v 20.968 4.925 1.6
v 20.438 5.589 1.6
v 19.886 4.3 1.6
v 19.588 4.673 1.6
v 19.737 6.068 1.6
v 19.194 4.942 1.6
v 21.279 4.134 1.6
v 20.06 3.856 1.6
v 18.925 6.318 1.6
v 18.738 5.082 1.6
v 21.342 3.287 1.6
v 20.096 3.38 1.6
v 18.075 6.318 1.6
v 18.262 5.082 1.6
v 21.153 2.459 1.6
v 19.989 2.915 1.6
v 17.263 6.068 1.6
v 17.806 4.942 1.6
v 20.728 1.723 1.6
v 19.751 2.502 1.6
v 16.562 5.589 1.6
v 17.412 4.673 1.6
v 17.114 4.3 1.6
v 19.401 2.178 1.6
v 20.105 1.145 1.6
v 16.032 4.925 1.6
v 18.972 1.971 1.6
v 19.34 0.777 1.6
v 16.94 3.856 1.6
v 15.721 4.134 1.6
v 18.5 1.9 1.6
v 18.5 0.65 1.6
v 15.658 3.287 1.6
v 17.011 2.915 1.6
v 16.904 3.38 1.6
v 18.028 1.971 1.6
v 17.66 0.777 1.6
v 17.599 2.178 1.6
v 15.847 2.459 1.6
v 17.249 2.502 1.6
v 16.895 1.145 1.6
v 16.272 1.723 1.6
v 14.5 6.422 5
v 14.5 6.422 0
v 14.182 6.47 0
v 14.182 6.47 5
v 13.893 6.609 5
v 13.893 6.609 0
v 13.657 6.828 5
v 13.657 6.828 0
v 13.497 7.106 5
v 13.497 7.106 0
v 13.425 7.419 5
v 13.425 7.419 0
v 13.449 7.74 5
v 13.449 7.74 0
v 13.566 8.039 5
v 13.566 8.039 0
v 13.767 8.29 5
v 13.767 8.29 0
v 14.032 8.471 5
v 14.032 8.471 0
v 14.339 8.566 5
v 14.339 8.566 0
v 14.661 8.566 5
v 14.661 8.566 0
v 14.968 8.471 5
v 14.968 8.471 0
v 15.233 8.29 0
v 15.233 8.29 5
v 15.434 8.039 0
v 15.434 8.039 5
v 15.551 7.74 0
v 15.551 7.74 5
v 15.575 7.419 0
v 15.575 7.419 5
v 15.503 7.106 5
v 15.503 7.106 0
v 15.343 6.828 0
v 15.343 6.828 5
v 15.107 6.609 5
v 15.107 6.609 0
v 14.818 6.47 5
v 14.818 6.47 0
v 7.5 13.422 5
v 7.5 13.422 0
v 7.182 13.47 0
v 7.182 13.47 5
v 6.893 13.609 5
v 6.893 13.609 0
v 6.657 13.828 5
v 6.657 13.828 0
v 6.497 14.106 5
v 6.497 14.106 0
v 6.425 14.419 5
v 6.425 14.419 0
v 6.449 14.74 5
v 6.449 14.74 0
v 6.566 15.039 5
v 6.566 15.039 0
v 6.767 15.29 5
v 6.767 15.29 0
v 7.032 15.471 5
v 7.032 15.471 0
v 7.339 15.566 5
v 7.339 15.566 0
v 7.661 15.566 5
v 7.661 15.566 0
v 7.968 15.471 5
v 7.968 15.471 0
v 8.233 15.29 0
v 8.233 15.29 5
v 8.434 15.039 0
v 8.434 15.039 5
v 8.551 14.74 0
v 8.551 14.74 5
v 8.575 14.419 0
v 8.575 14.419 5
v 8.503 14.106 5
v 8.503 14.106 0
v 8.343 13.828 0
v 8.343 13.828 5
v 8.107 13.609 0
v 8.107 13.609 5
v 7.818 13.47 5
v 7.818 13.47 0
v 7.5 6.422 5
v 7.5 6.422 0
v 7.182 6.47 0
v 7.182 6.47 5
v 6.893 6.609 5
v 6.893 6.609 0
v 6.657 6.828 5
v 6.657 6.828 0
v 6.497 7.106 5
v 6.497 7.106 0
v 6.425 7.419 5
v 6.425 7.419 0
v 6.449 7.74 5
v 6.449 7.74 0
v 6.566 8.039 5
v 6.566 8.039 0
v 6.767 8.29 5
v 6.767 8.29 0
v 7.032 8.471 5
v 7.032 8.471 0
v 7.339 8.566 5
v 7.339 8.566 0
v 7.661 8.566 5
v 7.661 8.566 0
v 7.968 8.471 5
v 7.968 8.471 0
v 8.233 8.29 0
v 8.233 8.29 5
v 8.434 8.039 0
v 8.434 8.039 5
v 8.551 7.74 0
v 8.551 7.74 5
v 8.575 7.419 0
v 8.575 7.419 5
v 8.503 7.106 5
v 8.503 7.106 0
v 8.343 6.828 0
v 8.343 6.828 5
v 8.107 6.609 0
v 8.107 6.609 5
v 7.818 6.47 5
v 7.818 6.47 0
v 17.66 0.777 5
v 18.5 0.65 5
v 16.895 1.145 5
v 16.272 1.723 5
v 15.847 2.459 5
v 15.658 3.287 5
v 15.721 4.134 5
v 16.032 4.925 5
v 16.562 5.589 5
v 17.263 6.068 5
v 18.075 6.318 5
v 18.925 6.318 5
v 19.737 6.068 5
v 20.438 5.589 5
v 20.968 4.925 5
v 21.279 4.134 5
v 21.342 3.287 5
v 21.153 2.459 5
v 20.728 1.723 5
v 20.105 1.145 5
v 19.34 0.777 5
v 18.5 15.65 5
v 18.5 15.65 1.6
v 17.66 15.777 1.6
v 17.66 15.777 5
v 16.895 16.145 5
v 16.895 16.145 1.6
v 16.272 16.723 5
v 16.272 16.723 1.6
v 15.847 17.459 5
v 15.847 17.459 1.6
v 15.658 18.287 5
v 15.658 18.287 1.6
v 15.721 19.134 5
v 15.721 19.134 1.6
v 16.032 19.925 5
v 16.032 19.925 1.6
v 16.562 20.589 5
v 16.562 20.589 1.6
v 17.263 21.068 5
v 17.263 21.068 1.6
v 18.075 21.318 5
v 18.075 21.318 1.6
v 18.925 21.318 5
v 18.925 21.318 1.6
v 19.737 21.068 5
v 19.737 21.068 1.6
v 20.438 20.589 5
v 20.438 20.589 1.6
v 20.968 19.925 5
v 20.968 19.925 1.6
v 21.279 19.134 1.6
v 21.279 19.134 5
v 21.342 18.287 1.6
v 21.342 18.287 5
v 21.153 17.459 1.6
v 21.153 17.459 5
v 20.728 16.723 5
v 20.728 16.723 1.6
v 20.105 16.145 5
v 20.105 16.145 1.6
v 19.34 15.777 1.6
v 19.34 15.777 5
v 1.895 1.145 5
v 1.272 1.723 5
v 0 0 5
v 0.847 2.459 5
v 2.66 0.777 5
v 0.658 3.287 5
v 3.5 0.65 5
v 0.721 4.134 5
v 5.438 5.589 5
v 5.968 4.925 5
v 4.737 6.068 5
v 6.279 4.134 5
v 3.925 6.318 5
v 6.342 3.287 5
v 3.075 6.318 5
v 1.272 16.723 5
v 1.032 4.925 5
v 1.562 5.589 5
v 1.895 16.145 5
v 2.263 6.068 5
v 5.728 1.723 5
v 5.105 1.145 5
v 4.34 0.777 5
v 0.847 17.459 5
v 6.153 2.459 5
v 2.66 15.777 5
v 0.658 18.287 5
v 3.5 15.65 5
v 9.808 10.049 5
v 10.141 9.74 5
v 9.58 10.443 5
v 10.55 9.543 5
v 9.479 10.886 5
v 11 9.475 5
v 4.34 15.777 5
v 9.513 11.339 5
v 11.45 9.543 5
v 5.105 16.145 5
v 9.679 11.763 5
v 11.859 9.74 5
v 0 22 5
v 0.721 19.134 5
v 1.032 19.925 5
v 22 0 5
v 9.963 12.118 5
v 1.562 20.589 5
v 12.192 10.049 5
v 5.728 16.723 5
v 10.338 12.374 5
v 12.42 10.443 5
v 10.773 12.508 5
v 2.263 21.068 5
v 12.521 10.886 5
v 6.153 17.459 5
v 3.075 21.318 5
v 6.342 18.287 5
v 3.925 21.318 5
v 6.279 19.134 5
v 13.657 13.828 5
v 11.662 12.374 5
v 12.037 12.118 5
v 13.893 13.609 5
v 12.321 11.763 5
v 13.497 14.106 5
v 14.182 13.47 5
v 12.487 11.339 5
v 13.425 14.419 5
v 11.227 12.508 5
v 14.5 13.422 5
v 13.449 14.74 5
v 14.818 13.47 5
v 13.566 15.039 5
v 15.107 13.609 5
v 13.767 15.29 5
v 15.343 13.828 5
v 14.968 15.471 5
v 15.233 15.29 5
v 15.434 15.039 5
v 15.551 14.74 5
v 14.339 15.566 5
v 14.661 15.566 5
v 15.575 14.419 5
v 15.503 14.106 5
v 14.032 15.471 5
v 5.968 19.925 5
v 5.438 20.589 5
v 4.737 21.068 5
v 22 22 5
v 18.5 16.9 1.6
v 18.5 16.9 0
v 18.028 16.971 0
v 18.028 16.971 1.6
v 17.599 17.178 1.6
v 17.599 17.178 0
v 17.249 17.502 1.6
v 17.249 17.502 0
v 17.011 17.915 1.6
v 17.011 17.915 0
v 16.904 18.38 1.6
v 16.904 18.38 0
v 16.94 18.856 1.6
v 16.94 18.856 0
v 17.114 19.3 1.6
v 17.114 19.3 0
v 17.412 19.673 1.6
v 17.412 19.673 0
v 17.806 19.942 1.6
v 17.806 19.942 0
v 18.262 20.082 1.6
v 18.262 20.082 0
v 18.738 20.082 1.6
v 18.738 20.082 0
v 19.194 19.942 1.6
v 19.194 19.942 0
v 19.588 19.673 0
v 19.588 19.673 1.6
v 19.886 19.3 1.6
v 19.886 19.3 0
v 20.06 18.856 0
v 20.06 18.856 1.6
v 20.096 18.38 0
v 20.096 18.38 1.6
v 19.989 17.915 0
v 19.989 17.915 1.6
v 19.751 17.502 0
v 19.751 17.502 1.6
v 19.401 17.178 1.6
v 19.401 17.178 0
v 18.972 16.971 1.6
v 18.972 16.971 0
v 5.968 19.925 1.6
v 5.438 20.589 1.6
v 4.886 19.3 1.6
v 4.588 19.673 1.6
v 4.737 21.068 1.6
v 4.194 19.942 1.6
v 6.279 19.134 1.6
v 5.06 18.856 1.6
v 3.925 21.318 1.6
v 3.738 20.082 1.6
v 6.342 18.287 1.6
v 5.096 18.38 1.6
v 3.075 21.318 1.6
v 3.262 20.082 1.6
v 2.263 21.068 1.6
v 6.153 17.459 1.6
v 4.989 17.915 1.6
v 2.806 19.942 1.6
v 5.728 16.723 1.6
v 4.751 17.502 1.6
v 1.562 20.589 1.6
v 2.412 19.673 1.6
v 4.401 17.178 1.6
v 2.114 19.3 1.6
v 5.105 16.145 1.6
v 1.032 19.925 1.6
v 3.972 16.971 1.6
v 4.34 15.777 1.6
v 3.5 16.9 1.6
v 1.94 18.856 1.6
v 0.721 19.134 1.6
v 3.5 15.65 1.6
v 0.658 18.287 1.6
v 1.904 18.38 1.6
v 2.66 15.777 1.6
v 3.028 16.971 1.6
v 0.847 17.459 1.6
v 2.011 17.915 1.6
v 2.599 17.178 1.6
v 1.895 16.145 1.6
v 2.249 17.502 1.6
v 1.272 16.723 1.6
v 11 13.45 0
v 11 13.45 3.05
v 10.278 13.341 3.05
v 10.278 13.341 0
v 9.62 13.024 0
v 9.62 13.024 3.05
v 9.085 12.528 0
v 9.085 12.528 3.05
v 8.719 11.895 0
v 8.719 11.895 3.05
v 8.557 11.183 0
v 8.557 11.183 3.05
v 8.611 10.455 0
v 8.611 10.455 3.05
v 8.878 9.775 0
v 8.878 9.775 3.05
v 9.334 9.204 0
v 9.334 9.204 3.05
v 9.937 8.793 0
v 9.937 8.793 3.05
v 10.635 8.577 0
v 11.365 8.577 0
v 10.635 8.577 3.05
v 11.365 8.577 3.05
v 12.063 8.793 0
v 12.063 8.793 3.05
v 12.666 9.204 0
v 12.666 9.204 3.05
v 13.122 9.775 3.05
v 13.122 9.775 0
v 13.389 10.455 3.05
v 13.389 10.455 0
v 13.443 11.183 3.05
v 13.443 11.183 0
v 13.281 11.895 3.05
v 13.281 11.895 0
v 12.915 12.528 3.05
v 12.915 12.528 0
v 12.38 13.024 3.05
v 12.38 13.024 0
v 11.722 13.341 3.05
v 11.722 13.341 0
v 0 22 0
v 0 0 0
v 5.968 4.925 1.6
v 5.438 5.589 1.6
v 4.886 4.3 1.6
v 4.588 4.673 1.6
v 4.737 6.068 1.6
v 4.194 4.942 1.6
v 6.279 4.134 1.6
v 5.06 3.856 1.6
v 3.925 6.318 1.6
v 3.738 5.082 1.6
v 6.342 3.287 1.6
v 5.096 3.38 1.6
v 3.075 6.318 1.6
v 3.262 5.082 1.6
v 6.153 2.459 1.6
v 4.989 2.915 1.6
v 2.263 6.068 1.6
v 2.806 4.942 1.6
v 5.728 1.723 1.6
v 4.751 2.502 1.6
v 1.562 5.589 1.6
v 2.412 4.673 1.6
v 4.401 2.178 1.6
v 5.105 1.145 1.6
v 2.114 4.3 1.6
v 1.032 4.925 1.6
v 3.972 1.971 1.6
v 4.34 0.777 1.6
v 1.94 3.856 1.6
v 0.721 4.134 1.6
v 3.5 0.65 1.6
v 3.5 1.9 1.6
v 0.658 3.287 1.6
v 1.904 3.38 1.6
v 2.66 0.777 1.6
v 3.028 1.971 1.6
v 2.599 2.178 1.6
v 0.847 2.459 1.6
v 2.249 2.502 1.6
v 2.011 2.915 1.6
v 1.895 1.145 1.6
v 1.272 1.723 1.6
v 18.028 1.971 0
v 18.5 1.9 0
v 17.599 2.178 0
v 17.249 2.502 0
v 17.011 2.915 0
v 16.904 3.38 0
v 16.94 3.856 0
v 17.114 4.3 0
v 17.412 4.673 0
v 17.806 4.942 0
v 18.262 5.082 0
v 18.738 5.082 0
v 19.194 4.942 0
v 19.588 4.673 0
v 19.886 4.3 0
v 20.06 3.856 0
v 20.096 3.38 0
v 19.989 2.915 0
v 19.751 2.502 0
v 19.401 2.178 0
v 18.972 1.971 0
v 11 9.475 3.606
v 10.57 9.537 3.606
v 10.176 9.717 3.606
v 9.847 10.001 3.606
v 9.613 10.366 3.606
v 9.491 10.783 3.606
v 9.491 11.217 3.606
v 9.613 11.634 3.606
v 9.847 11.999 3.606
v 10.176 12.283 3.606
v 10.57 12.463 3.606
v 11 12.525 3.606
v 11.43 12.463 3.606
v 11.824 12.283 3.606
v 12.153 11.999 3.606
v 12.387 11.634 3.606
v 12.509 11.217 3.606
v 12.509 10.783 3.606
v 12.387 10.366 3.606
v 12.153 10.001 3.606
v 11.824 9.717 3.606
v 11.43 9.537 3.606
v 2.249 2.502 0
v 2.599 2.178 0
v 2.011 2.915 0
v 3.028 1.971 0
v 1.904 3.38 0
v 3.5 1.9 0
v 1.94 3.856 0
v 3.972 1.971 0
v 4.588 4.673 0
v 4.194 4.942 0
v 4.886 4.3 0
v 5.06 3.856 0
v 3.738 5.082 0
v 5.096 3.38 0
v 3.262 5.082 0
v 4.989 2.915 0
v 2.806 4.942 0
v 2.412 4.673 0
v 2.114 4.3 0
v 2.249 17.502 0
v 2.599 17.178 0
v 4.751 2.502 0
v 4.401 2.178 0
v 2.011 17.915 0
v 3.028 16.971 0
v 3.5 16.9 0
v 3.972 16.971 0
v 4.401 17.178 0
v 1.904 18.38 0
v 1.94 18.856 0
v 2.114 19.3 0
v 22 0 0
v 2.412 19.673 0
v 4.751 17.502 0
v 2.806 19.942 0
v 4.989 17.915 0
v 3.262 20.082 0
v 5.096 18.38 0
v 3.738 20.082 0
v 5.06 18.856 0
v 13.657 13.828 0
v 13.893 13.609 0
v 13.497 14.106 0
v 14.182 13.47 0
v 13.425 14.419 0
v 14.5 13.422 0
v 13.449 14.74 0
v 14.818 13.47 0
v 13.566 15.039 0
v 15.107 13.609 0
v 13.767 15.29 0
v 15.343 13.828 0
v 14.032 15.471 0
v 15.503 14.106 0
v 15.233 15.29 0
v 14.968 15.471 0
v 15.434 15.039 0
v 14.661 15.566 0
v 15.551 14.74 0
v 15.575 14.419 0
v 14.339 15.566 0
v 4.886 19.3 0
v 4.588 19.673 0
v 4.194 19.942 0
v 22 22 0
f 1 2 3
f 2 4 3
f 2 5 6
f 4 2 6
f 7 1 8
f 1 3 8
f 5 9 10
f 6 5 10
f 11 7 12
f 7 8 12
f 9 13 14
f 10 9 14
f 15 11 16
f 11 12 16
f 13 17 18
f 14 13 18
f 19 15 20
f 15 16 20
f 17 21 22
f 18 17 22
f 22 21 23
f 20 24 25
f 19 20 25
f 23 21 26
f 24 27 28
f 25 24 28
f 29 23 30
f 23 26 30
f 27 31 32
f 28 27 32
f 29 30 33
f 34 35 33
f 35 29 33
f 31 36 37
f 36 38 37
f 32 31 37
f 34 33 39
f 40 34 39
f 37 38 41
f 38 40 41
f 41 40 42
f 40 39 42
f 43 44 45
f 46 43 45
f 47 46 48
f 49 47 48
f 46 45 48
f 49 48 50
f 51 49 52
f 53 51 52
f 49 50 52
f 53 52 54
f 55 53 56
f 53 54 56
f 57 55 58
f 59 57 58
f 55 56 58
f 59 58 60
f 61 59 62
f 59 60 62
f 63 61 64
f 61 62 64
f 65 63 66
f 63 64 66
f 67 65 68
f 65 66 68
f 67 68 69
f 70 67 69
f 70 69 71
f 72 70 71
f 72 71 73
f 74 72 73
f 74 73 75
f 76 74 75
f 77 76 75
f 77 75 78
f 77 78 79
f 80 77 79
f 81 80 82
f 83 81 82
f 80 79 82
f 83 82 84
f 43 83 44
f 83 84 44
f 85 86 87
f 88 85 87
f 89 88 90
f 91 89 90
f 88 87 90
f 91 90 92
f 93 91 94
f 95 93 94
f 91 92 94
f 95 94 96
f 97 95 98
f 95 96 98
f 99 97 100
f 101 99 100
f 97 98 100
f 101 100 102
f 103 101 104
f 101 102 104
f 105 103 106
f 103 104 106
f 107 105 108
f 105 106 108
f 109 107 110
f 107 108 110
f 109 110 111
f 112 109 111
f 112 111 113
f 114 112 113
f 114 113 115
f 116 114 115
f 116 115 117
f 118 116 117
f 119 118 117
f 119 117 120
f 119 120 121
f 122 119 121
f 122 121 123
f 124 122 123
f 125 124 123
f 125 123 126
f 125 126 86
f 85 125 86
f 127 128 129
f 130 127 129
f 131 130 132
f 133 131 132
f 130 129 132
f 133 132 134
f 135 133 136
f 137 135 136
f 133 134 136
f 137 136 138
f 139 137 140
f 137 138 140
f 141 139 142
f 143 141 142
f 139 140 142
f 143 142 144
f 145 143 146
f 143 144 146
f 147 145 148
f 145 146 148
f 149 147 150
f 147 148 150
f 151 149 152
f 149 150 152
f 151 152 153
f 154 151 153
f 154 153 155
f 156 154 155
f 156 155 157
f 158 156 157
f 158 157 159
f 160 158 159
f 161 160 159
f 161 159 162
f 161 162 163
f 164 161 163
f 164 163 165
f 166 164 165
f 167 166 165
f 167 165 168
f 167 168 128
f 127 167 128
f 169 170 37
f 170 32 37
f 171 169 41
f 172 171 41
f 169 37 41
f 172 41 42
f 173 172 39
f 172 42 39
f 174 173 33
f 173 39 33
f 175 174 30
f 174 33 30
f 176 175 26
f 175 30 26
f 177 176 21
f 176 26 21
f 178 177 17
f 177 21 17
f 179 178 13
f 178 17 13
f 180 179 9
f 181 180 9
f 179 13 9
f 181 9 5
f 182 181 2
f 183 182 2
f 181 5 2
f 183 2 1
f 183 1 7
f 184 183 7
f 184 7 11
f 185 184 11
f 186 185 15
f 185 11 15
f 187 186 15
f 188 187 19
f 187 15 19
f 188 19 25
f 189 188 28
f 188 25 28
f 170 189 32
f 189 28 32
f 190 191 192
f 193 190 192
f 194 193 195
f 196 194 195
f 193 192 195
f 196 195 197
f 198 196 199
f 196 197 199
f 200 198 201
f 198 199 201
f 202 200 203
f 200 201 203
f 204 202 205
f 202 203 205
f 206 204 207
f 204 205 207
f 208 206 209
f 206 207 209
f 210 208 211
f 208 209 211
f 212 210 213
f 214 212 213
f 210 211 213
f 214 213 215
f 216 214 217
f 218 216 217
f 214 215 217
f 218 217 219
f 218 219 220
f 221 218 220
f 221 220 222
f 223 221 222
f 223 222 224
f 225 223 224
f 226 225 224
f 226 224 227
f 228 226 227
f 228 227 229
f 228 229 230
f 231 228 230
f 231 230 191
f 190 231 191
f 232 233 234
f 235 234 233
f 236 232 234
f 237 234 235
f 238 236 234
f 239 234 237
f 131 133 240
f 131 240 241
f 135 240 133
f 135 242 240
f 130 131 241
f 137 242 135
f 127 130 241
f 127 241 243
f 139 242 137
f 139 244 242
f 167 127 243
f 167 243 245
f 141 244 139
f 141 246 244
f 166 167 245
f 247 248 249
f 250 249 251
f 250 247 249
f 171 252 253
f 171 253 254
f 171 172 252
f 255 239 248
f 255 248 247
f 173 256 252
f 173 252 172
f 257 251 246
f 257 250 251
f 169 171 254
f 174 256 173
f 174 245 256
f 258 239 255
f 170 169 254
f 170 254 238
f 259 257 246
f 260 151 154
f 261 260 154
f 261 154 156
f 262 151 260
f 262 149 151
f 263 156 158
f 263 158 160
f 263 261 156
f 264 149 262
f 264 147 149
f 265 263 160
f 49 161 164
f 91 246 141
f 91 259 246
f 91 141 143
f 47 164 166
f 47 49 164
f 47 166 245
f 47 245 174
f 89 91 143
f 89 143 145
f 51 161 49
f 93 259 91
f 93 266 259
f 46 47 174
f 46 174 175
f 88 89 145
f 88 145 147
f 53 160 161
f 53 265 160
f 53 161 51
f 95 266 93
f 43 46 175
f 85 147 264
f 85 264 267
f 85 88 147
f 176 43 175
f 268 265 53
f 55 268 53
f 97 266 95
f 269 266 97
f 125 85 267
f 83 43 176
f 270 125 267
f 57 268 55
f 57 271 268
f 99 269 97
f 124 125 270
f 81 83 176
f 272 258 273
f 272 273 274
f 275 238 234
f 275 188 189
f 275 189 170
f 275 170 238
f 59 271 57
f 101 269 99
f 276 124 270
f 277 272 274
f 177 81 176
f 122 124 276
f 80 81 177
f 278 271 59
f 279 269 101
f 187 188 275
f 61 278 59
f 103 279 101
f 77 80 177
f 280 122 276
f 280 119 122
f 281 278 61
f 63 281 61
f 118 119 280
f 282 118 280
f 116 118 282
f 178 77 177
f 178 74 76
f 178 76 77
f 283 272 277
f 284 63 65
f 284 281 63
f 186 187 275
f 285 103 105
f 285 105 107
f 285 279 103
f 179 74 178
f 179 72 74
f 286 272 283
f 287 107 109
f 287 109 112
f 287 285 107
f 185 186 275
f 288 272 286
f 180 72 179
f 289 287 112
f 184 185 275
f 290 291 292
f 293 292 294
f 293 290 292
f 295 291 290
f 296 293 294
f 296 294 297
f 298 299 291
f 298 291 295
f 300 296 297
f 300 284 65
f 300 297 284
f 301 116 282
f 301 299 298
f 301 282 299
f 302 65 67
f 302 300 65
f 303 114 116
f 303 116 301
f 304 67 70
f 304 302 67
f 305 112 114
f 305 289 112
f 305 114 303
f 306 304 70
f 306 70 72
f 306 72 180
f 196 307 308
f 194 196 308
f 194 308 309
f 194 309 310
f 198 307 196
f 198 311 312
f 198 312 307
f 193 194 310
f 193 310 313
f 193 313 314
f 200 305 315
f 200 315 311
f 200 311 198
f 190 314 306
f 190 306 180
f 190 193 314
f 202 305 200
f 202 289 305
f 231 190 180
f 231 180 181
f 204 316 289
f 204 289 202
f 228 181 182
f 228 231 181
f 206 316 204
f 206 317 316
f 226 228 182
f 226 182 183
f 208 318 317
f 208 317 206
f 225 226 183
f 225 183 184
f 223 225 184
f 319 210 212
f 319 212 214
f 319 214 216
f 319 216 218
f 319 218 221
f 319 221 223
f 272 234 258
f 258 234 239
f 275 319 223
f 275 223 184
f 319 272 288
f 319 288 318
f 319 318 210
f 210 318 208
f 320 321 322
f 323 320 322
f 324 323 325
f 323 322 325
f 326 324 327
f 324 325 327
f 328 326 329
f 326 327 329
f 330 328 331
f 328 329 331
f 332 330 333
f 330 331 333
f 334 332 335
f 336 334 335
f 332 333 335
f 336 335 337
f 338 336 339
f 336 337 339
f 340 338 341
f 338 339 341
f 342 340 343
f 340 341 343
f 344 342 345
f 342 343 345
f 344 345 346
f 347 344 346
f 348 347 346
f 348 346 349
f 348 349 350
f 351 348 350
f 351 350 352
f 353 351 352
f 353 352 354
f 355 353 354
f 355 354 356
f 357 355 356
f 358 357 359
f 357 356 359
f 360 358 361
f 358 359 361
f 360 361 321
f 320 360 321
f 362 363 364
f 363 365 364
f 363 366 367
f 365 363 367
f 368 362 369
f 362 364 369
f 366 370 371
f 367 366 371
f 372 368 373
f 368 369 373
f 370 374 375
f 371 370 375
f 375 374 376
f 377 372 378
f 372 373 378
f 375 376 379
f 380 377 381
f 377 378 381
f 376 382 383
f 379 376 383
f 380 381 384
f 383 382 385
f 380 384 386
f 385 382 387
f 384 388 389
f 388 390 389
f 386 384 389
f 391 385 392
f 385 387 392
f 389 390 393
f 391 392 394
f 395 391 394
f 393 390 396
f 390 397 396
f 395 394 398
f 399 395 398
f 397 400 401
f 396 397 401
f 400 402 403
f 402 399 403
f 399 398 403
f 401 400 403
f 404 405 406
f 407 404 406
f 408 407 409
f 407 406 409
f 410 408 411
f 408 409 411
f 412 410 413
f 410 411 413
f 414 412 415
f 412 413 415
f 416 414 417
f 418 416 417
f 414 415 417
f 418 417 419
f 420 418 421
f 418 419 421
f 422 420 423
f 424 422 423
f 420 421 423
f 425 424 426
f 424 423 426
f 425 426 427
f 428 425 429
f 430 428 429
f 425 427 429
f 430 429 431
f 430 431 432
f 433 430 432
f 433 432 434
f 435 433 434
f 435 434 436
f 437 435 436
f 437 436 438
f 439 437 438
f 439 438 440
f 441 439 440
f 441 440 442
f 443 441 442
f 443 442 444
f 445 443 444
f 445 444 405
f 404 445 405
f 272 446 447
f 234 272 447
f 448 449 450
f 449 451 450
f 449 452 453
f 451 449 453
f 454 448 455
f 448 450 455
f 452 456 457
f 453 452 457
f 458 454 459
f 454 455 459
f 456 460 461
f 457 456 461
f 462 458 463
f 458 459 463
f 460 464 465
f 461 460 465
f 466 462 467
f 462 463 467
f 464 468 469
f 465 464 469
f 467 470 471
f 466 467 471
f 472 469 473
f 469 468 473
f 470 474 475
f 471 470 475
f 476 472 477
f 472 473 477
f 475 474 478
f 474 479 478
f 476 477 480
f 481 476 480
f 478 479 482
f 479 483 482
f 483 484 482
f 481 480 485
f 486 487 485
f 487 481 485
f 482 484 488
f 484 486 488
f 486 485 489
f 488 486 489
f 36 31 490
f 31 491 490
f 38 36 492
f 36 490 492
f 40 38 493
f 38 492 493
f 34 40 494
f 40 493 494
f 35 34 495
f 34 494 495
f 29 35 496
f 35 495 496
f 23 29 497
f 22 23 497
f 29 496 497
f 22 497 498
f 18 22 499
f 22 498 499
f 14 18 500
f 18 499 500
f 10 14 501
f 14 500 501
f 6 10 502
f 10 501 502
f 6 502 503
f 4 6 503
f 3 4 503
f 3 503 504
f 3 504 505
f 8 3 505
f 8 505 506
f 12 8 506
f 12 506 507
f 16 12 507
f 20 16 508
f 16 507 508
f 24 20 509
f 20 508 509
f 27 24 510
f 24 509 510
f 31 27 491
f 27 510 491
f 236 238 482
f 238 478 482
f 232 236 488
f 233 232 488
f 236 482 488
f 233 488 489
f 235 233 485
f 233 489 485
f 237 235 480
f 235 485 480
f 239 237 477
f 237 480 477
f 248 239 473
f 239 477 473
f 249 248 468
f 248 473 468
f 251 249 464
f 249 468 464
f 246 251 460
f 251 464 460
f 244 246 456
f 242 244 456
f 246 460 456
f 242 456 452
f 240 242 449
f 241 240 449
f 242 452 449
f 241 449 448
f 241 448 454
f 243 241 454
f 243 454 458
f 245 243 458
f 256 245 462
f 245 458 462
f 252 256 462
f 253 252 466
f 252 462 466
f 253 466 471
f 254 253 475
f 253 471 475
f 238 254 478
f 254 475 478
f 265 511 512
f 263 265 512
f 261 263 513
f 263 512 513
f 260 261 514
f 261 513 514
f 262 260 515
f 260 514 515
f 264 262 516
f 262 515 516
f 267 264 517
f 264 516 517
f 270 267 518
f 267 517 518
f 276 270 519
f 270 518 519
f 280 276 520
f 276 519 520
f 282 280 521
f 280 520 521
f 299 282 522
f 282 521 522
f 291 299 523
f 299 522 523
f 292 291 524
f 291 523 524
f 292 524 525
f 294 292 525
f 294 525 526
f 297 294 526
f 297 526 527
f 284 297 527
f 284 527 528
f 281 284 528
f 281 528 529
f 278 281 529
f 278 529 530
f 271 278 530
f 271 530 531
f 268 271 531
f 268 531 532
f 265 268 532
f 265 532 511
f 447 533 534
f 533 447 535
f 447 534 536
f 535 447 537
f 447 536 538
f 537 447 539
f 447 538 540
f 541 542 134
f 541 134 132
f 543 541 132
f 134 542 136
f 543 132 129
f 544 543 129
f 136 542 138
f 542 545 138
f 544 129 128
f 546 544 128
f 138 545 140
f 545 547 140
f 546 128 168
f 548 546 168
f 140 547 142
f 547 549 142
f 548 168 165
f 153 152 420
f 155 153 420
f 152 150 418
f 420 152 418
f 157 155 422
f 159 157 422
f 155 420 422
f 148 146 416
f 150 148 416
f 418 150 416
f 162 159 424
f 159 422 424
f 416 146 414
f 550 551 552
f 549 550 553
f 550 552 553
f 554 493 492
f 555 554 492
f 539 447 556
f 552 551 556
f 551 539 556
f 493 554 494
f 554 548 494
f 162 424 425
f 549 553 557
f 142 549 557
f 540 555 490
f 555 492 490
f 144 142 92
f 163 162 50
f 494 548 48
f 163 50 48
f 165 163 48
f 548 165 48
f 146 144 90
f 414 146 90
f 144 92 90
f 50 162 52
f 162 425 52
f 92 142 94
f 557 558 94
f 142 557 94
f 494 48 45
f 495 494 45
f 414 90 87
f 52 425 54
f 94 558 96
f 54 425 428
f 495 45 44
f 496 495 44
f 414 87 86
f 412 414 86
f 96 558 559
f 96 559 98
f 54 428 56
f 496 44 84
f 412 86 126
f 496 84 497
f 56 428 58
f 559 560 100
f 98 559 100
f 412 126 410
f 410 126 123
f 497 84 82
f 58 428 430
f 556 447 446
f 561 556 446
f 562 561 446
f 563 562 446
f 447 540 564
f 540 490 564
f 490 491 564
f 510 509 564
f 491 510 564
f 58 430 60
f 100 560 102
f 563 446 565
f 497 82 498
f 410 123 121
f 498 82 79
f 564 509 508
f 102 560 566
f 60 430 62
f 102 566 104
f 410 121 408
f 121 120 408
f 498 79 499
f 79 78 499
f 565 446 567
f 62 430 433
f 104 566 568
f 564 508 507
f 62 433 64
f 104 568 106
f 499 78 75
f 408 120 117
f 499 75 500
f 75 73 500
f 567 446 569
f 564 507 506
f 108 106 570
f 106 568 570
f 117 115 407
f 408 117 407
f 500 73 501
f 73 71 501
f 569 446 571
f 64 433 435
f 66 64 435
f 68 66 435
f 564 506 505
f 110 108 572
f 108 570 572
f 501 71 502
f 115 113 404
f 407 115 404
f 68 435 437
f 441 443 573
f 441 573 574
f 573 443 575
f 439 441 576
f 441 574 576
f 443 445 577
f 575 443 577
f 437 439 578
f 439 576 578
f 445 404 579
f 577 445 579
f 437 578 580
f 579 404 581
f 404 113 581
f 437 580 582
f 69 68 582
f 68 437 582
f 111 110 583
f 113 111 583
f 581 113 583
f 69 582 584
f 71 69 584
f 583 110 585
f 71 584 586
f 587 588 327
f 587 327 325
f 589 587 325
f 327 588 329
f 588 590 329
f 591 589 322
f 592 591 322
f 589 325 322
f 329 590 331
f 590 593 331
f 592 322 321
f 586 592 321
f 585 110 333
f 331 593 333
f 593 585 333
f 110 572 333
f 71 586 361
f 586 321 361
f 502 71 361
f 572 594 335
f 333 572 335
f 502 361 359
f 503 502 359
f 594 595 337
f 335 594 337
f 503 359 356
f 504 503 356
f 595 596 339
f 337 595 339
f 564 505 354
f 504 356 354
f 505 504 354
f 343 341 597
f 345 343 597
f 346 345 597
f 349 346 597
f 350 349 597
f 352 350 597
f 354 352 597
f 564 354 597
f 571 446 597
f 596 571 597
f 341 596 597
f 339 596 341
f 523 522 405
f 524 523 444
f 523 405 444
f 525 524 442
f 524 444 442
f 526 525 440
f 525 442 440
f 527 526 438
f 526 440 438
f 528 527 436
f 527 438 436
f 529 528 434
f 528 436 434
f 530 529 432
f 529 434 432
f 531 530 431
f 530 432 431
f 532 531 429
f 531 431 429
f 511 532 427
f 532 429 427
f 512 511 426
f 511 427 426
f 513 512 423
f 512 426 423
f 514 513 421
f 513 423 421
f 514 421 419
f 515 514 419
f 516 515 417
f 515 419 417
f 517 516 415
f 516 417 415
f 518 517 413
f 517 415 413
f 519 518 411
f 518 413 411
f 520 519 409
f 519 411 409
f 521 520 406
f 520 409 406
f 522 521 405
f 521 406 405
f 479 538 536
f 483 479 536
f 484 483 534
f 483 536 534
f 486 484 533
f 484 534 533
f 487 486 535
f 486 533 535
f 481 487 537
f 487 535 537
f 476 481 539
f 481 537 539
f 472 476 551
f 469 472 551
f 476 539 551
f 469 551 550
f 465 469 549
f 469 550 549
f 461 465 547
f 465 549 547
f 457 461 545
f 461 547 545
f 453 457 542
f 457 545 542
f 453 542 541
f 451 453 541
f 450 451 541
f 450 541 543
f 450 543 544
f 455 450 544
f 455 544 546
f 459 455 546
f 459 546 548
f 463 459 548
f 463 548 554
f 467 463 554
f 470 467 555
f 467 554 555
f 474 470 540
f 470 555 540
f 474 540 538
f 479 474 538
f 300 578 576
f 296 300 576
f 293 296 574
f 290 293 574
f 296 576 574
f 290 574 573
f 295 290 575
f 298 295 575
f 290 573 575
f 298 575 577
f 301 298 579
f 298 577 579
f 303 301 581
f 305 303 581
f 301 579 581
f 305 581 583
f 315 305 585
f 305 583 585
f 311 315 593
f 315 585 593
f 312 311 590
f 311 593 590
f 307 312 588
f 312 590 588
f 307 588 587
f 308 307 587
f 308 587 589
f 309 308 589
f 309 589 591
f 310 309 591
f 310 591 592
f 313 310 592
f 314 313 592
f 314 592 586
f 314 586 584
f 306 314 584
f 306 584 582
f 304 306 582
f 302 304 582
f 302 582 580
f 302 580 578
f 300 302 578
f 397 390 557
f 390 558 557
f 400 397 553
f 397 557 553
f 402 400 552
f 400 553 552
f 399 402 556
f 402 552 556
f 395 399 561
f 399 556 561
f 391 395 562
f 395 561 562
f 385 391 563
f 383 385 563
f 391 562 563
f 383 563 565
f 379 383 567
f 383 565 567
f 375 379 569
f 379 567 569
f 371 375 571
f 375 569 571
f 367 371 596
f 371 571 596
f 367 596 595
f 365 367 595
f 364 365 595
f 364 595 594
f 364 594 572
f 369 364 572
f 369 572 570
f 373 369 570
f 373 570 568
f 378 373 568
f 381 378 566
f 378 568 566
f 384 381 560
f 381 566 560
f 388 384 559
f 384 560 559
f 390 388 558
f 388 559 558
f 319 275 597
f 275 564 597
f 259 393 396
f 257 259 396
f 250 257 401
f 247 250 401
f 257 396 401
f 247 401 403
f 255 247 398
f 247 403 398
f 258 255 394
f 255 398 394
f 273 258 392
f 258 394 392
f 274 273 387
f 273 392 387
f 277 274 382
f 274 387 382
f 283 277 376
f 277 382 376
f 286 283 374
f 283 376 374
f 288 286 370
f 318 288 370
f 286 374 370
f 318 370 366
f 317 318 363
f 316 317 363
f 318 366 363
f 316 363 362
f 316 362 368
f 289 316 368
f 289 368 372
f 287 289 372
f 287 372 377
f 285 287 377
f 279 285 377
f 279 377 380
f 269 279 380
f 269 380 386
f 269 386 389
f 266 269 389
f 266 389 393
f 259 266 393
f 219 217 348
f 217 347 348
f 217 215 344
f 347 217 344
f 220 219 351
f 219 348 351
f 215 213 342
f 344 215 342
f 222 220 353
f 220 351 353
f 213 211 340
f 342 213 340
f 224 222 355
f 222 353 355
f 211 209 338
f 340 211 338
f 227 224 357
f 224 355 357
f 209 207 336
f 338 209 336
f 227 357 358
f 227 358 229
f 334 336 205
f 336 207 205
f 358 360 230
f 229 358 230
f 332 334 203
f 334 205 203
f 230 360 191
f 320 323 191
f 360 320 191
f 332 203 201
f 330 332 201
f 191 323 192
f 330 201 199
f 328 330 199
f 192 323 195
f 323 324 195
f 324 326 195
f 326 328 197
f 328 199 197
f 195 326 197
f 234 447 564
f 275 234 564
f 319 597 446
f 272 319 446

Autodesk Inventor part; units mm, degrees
ref_plane "YZ Plane" through (0, 0, 0) normal (1, 0, 0) x (0, 1, 0)
ref_plane "XZ Plane" through (0, 0, 0) normal (0, 1, 0) x (-1, 0, 0)
ref_plane "XY Plane" through (0, 0, 0) normal (0, 0, 1) x (1, 0, 0)
sketch "Sketch1" plane through (0, 0, 0) normal (0, 0, 1) x (1, 0, 0)
  line L0 (0, 0) -> (22, 0)
  line L1 (22, 0) -> (22, 22)
  line L2 (22, 22) -> (0, 22)
  line L3 (0, 22) -> (0, 0)
  dimension "d0" = 22
  dimension "d1" = 22
extrude "Extrusion1" add sketch "Sketch1" along normal blind 5
sketch "Sketch2" plane through (0, 0, 5) normal (0, 0, 1) x (1, 0, 0)
  circle A0 centre (3.5, 18.5) radius 1.5
  circle A1 centre (18.5, 18.5) radius 1.5
  line L0 (0, 22) -> (0, 0) projected
  line L1 (22, 22) -> (0, 22) projected
  circle A2 centre (3.5, 3.5) radius 1.5
  line L2 (0, 0) -> (22, 0) projected
  circle A3 centre (18.5, 3.5) radius 1.5
  line L3 (22, 0) -> (22, 22) projected
  dimension "d4" = 3
  dimension "d5" = 3
  dimension "d6" = 3.5
  dimension "d7" = 15
  dimension "d8" = 3.5
  dimension "d9" = 3.5
  dimension "d10" = 3
  dimension "d11" = 3.5
  dimension "d12" = 3.5
  dimension "d13" = 3
  dimension "d14" = 3.5
  dimension "d15" = 3.5
hole "Hole1" at (3.5, 18.5, 5) at (18.5, 18.5, 5) at (18.5, 3.5, 5) at (3.5, 3.5, 5) direction (0, 0, -1) diameter 3.2 end through all counterbore diameter 5.7 counterbore depth 3.4
sketch "Sketch3" plane through (0, 0, 5) normal (0, 0, 1) x (1, 0, 0)
  circle A0 centre (7.5, 7.5) radius 1.5
  line L0 (0, 22) -> (0, 0) projected
  line L1 (0, 0) -> (22, 0) projected
  circle A1 centre (7.5, 14.5) radius 1.5
  circle A2 centre (14.5, 7.5) radius 1.5
  circle A3 centre (14.5, 14.5) radius 1.5
  dimension "d23" = 3
  dimension "d24" = 7.5
  dimension "d25" = 7.5
  dimension "d33" = 3
  dimension "d34" = 3
  dimension "d35" = 3
  dimension "d36" = 7
  dimension "d37" = 7
  dimension "d38" = 7
  dimension "d39" = 0
  dimension "d40" = 7.5
  dimension "d41" = 7
hole "Hole2" at (7.5, 7.5, 5) at (7.5, 14.5, 5) at (14.5, 7.5, 5) at (14.5, 14.5, 5) direction (0, 0, -1) diameter 2.156 end through all thread size "4-40 UNC" class "2B" standard "ANSI Unified Screw Threads"
sketch "Sketch7" plane through (0, 0, 5) normal (0, 0, 1) x (1, 0, 0)
  circle A0 centre (11, 11) radius 1.5
  line L0 (22, 22) -> (0, 22) projected
  line L1 (22, 0) -> (22, 22) projected
  point P0 (0, 0)
  dimension "d64" = 3
  dimension "d65" = 11
  dimension "d66" = 11
hole "Hole5" at (11, 11, 5) direction (0, 0, -1) diameter 3.05 end through all
sketch "Sketch8" plane through (0, 0, 0) normal (0, 0, -1) x (-1, 0, 0)
  circle A0 centre (-11, 11) radius 1.525 projected
  circle A1 centre (-11, 11) radius 2.45
  point P0 (0, 0)
  dimension "d74" = 4.9
hole "Hole6" at (11, 11, 0) direction (0, 0, 1) diameter 4.9 depth 3.05 tip angle 118
equation "\"d21\" = Thickness"
equation "\"d23\" = d35"
equation "\"d33\" = d35"
equation "\"d34\" = d35"
equation "\"d36\" = d38"
equation "\"d37\" = d38"
equation "\"d40\" = d25"
equation "\"BendRadius\" = Thickness"
equation "\"BendReliefWidth\" = Thickness"
equation "\"BendReliefDepth\" = 0.5 * Thickness"
equation "\"CornerReliefSize\" = 4 * Thickness"
equation "\"MinimumRemnant\" = 2 * Thickness"
equation "\"TransitionRadius\" = BendRadius"
equation "\"JacobiRadiusSize\" = BendRadius"
equation "\"GapSize\" = Thickness"
equation "\"Thickness\" = 0.5"
properties part number "sample holder mount on PI_V_522_v2"
